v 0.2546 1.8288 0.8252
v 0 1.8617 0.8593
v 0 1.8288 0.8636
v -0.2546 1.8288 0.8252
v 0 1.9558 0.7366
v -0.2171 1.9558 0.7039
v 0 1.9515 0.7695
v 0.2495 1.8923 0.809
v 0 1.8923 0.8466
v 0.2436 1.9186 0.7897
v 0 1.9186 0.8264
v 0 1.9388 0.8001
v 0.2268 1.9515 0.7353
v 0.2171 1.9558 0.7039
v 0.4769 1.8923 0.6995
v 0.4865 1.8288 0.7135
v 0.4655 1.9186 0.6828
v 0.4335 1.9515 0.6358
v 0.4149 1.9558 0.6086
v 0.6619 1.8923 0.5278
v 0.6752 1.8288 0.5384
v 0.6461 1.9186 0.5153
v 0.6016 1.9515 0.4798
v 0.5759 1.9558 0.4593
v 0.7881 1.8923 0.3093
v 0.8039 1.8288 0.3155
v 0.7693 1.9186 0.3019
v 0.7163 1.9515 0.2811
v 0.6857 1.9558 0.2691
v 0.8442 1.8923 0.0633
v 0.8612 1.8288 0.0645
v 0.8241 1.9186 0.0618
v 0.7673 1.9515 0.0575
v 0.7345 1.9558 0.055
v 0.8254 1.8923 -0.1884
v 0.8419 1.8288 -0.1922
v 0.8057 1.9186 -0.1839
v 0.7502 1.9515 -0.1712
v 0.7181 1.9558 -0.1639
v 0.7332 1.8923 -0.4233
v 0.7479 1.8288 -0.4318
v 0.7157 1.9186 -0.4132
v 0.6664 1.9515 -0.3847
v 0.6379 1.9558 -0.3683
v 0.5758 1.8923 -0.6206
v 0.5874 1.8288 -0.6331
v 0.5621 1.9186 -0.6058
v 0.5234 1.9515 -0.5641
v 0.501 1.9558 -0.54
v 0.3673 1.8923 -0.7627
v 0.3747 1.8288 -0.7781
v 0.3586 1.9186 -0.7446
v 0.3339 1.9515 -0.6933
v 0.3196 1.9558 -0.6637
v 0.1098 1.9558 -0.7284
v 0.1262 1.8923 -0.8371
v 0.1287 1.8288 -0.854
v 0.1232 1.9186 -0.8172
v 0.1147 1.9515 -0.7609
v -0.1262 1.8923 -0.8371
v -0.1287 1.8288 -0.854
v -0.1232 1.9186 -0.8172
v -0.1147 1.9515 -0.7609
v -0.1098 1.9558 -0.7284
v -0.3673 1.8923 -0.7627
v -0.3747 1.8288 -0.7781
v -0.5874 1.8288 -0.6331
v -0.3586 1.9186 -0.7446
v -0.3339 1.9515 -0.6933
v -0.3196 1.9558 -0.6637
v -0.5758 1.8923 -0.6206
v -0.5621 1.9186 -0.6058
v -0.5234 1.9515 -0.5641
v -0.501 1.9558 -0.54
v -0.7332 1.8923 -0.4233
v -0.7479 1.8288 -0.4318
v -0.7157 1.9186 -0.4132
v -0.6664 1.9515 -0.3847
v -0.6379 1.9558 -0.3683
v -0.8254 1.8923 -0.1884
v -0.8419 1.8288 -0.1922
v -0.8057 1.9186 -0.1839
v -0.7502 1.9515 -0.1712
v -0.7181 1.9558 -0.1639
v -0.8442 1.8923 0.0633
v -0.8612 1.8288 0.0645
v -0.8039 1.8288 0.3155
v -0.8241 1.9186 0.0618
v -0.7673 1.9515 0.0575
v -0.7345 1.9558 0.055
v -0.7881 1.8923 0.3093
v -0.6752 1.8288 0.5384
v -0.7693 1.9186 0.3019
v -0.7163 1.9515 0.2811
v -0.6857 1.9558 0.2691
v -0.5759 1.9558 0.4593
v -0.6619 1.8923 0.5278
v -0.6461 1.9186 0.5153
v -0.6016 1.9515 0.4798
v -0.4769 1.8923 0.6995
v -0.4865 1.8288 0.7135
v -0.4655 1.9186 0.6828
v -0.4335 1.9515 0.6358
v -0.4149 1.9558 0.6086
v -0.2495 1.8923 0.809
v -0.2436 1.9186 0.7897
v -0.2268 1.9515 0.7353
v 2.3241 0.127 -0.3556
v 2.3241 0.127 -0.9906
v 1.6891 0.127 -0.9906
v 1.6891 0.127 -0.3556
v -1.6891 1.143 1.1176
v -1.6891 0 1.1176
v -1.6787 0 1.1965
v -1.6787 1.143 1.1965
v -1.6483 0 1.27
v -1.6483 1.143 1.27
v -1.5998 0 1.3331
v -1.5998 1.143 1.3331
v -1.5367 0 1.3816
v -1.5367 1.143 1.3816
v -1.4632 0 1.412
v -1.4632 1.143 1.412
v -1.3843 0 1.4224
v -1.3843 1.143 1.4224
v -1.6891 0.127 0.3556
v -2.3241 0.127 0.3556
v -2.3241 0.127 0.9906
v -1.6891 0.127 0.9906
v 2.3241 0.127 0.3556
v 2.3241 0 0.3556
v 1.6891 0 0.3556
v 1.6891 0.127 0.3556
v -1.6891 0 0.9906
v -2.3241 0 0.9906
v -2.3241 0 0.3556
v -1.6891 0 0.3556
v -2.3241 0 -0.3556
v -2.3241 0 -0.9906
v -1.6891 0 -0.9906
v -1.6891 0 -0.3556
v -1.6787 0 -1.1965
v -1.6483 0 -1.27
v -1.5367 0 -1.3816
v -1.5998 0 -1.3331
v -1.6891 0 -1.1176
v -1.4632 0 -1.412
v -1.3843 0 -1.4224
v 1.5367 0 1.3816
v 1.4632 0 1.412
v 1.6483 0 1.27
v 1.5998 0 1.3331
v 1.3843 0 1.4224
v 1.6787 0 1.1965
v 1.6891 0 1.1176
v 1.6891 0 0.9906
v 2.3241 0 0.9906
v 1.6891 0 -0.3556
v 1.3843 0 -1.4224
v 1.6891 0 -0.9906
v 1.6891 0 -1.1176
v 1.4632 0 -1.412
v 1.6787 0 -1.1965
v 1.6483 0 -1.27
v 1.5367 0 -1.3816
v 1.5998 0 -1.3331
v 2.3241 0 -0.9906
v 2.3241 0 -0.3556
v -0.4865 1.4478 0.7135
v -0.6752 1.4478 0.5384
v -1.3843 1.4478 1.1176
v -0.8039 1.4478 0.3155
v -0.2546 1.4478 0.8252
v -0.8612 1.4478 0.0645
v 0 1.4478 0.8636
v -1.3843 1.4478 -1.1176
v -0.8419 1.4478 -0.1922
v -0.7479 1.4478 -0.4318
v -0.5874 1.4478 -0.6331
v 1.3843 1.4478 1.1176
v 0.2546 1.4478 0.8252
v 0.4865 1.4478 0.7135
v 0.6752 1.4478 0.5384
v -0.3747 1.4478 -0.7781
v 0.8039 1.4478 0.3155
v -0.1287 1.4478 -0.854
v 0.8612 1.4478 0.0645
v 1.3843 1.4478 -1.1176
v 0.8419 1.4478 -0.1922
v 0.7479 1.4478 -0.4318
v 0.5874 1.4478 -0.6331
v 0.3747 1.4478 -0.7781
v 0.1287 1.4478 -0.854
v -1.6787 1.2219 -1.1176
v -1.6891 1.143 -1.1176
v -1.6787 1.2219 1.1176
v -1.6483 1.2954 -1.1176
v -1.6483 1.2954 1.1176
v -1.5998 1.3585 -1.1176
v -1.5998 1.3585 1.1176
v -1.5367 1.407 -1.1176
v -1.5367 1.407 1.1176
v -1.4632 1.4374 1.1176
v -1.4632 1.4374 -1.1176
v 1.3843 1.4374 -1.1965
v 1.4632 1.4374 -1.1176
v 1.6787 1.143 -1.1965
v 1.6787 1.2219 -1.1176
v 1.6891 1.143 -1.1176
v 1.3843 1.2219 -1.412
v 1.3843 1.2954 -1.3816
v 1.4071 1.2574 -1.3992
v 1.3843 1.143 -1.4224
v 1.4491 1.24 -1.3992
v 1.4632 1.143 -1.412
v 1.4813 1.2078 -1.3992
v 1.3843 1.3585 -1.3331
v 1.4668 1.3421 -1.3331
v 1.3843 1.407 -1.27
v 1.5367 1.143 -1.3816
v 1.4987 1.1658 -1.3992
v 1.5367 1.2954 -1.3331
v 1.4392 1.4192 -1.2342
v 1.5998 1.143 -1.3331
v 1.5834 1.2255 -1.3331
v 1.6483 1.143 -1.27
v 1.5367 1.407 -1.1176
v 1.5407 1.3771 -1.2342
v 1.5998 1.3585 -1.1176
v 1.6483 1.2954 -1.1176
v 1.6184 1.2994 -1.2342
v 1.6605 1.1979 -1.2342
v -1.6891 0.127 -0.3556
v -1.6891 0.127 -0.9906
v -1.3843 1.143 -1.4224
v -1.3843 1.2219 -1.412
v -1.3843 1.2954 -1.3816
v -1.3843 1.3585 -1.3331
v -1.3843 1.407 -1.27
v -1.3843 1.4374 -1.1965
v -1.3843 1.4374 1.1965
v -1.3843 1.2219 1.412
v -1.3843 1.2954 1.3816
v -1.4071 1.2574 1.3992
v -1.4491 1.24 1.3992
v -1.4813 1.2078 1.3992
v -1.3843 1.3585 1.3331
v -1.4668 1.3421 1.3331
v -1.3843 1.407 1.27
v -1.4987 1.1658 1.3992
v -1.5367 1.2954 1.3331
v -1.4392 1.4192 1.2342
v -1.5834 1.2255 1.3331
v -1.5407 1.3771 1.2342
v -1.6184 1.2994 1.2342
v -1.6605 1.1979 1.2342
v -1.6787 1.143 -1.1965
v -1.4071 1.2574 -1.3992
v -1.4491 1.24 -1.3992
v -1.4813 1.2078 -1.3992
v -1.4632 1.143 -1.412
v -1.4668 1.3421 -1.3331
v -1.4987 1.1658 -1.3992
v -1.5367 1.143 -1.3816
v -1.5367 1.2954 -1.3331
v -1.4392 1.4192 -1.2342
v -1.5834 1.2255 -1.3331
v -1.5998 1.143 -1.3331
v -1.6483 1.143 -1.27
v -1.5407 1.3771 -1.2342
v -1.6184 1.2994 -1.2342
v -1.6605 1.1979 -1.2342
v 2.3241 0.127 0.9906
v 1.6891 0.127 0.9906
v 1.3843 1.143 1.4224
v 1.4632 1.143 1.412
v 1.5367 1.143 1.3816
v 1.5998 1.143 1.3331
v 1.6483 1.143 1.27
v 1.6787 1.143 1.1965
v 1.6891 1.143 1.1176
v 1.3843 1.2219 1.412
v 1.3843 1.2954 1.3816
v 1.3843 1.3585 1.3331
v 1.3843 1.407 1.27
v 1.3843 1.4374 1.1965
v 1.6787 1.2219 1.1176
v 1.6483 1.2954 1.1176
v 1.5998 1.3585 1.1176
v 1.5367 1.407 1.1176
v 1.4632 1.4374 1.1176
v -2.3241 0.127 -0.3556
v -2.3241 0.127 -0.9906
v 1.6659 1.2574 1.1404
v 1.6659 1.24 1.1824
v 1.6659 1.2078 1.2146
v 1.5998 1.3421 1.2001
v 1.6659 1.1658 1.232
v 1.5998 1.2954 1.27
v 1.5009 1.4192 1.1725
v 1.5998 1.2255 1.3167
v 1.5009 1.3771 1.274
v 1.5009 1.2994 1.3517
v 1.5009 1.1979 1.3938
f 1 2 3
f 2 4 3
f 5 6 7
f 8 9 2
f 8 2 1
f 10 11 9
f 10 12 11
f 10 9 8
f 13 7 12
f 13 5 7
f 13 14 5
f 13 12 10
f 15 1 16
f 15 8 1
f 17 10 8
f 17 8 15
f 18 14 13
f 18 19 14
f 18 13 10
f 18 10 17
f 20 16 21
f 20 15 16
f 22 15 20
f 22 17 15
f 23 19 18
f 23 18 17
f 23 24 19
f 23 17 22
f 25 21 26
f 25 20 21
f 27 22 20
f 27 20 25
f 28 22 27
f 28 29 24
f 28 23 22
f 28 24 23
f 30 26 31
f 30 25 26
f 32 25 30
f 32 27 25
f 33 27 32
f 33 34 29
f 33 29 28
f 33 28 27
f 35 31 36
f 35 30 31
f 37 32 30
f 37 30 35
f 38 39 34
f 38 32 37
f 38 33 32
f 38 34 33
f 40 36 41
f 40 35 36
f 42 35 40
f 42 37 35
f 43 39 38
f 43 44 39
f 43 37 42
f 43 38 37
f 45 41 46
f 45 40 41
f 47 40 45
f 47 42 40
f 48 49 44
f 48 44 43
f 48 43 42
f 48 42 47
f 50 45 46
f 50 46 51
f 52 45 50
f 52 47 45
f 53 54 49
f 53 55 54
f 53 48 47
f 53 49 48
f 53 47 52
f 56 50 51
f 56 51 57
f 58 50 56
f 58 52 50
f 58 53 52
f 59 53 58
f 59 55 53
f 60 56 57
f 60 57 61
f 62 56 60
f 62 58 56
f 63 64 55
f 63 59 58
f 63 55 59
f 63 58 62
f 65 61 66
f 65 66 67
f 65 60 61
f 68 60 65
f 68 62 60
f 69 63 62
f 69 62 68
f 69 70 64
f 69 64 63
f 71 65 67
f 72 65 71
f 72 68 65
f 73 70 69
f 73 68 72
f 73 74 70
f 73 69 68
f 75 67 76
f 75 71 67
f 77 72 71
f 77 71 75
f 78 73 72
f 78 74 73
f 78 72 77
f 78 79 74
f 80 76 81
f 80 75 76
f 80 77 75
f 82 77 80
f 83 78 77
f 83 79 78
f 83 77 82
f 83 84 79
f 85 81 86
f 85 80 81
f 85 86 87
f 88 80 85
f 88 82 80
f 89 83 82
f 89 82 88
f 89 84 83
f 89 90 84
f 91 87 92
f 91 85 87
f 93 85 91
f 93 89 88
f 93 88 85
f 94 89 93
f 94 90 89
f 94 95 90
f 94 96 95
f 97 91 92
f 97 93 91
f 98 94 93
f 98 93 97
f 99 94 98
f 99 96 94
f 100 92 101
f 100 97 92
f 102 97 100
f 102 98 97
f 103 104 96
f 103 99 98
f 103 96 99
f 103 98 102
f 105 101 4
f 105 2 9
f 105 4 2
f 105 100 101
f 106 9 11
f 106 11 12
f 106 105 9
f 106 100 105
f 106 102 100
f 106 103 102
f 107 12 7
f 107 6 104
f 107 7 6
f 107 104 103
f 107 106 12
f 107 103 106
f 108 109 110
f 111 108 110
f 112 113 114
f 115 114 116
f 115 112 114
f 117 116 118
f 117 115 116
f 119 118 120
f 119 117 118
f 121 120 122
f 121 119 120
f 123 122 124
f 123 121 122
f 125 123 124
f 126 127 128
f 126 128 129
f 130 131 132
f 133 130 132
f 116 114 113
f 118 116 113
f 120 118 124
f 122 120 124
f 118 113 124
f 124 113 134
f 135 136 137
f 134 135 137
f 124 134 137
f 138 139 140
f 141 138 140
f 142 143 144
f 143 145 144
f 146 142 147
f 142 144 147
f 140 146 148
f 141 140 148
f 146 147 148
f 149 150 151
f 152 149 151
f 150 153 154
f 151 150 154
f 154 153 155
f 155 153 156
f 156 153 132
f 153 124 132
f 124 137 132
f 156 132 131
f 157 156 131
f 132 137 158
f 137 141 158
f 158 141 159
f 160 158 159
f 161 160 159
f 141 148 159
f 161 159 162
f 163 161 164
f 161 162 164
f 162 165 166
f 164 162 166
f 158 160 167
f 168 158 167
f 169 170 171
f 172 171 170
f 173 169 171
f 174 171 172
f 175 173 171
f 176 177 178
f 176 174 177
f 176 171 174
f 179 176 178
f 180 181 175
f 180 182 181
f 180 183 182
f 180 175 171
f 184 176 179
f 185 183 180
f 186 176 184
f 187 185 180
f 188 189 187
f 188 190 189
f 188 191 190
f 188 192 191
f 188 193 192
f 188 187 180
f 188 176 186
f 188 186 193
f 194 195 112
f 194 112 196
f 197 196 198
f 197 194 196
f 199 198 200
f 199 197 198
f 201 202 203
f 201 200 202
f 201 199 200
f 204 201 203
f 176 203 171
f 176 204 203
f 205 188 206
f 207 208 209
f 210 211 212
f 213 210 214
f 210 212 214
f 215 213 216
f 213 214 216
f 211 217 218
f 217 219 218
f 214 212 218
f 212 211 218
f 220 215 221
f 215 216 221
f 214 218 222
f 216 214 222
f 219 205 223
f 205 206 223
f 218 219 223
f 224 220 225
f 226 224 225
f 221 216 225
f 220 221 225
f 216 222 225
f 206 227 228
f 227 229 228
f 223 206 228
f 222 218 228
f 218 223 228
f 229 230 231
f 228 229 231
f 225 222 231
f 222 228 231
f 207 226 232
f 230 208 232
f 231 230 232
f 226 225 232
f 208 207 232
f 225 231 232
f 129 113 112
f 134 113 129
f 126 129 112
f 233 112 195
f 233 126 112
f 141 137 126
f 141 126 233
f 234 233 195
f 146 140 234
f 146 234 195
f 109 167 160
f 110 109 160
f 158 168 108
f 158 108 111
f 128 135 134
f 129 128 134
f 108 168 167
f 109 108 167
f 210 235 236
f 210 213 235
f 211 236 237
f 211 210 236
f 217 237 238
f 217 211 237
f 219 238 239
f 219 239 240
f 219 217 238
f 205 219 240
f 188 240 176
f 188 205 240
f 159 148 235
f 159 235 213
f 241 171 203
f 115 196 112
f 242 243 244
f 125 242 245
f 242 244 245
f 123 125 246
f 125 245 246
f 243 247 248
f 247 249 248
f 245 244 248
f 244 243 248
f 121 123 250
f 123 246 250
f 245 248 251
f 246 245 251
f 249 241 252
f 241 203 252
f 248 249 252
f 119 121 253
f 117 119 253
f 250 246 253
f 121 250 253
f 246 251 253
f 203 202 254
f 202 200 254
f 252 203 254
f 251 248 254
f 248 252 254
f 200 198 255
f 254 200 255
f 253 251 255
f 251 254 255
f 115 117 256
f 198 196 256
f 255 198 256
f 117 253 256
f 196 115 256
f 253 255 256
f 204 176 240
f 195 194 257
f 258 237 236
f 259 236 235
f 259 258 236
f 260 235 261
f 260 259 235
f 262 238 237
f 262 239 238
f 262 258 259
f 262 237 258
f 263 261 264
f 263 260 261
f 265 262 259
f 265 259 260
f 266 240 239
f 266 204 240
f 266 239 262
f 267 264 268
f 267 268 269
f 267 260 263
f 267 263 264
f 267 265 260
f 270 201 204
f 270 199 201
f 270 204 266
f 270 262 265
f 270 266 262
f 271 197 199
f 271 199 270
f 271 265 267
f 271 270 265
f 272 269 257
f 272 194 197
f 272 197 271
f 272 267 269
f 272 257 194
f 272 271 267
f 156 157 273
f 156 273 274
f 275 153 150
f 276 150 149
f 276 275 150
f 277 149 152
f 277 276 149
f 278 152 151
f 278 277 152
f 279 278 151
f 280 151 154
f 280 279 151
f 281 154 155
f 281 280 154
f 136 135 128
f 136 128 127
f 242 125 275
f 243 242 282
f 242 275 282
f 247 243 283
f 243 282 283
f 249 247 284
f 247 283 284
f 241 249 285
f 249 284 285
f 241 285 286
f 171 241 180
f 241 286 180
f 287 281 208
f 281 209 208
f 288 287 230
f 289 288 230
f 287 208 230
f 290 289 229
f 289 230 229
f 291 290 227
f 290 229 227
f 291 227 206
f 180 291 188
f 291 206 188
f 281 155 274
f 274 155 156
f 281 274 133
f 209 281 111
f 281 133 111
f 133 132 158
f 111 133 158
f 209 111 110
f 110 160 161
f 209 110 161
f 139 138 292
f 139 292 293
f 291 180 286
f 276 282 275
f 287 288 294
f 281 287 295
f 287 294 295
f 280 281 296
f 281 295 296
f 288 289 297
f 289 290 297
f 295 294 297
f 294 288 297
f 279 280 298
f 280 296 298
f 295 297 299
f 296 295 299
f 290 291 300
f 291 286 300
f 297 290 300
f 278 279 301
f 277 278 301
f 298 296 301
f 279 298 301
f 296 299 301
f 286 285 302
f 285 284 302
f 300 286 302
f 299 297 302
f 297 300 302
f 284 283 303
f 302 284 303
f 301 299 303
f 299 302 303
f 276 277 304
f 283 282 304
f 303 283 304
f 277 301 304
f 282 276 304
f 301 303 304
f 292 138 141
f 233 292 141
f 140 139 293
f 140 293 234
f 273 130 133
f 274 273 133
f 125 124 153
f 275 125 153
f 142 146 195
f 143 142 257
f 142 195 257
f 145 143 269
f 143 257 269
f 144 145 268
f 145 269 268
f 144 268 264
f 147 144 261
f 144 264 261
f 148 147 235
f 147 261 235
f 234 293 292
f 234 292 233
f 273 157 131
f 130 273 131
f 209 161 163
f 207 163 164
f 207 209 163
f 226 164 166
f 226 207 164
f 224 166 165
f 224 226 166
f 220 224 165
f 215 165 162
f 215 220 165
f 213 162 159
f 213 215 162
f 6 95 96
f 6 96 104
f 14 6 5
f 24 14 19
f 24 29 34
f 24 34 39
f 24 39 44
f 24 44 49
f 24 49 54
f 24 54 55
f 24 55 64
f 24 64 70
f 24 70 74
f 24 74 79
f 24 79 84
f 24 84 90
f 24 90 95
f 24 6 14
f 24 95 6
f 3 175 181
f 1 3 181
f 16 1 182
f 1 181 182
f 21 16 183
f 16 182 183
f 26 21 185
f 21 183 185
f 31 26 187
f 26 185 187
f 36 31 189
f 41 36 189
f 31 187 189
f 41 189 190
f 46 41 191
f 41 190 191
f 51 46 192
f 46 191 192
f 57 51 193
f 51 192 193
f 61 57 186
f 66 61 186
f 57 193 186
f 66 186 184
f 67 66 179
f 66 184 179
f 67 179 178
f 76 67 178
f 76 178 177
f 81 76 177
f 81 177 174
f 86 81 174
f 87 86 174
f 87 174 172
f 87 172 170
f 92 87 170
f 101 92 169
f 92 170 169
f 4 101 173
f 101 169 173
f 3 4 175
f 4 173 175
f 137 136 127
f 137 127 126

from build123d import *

# Parameters (mm, degrees)
SKETCH1_W           = 3.3782
SKETCH1_H           = 2.8448
BOSS_EXTRUDE1_DEPTH = 1.4478
FILLET1_R           = 0.3048
SKETCH2_R           = 0.8636
BOSS_EXTRUDE2_DEPTH = 0.508
FILLET2_R           = 0.127
SKETCH3_W           = 0.635
SKETCH3_H           = 0.635
BOSS_EXTRUDE3_DEPTH = 0.127


with BuildPart() as part:
    # Sketch1 → Boss-Extrude1 (new body)
    with BuildSketch(Plane(origin=(0, 0, 0), x_dir=(1, 0, 0), z_dir=(0, 1, 0))):
        Rectangle(SKETCH1_W, SKETCH1_H)
    extrude(amount=BOSS_EXTRUDE1_DEPTH)

    # Fillet1
    fillet1_edges = [part.edges().sort_by_distance(p)[0] for p in [
        (-1.6891, 1.4478, 0),
        (0, 1.4478, 1.4224),
        (1.6891, 1.4478, 0),
        (0, 1.4478, -1.4224),
        (1.6891, 0.7239, 1.4224),
        (-1.6891, 0.7239, 1.4224),
        (-1.6891, 0.7239, -1.4224),
        (1.6891, 0.7239, -1.4224),
    ]]
    fillet(fillet1_edges, radius=FILLET1_R)

    # Sketch2 → Boss-Extrude2 (add)
    with BuildSketch(Plane(origin=(0, 1.4478, 0), x_dir=(1, 0, 0), z_dir=(0, 1, 0))):
        with Locations(Location((0, 0, 0), (0, 0, 270))):
            Circle(SKETCH2_R)
    extrude(amount=BOSS_EXTRUDE2_DEPTH)

    # Fillet2
    fillet2_edges = [part.edges().sort_by_distance(p)[0] for p in [
        (0, 1.9558, -0.8636),
    ]]
    fillet(fillet2_edges, radius=FILLET2_R)

    # Sketch3 → Boss-Extrude3 (add)
    with BuildSketch(Plane(origin=(0, 0, 0), x_dir=(1, 0, 0), z_dir=(0, 1, 0))):
        with Locations((-2.0066, 0.6731)):
            Rectangle(SKETCH3_W, SKETCH3_H)
        with Locations((-2.0066, -0.6731)):
            Rectangle(SKETCH3_W, SKETCH3_H)
    boss_extrude3 = extrude(amount=BOSS_EXTRUDE3_DEPTH)

    # Mirror1: Boss-Extrude3 across plane
    add(boss_extrude3.mirror(Plane(origin=(0, 0, 0), x_dir=(0, 0, 1), z_dir=(1, 0, 0))))


solid = part.part
